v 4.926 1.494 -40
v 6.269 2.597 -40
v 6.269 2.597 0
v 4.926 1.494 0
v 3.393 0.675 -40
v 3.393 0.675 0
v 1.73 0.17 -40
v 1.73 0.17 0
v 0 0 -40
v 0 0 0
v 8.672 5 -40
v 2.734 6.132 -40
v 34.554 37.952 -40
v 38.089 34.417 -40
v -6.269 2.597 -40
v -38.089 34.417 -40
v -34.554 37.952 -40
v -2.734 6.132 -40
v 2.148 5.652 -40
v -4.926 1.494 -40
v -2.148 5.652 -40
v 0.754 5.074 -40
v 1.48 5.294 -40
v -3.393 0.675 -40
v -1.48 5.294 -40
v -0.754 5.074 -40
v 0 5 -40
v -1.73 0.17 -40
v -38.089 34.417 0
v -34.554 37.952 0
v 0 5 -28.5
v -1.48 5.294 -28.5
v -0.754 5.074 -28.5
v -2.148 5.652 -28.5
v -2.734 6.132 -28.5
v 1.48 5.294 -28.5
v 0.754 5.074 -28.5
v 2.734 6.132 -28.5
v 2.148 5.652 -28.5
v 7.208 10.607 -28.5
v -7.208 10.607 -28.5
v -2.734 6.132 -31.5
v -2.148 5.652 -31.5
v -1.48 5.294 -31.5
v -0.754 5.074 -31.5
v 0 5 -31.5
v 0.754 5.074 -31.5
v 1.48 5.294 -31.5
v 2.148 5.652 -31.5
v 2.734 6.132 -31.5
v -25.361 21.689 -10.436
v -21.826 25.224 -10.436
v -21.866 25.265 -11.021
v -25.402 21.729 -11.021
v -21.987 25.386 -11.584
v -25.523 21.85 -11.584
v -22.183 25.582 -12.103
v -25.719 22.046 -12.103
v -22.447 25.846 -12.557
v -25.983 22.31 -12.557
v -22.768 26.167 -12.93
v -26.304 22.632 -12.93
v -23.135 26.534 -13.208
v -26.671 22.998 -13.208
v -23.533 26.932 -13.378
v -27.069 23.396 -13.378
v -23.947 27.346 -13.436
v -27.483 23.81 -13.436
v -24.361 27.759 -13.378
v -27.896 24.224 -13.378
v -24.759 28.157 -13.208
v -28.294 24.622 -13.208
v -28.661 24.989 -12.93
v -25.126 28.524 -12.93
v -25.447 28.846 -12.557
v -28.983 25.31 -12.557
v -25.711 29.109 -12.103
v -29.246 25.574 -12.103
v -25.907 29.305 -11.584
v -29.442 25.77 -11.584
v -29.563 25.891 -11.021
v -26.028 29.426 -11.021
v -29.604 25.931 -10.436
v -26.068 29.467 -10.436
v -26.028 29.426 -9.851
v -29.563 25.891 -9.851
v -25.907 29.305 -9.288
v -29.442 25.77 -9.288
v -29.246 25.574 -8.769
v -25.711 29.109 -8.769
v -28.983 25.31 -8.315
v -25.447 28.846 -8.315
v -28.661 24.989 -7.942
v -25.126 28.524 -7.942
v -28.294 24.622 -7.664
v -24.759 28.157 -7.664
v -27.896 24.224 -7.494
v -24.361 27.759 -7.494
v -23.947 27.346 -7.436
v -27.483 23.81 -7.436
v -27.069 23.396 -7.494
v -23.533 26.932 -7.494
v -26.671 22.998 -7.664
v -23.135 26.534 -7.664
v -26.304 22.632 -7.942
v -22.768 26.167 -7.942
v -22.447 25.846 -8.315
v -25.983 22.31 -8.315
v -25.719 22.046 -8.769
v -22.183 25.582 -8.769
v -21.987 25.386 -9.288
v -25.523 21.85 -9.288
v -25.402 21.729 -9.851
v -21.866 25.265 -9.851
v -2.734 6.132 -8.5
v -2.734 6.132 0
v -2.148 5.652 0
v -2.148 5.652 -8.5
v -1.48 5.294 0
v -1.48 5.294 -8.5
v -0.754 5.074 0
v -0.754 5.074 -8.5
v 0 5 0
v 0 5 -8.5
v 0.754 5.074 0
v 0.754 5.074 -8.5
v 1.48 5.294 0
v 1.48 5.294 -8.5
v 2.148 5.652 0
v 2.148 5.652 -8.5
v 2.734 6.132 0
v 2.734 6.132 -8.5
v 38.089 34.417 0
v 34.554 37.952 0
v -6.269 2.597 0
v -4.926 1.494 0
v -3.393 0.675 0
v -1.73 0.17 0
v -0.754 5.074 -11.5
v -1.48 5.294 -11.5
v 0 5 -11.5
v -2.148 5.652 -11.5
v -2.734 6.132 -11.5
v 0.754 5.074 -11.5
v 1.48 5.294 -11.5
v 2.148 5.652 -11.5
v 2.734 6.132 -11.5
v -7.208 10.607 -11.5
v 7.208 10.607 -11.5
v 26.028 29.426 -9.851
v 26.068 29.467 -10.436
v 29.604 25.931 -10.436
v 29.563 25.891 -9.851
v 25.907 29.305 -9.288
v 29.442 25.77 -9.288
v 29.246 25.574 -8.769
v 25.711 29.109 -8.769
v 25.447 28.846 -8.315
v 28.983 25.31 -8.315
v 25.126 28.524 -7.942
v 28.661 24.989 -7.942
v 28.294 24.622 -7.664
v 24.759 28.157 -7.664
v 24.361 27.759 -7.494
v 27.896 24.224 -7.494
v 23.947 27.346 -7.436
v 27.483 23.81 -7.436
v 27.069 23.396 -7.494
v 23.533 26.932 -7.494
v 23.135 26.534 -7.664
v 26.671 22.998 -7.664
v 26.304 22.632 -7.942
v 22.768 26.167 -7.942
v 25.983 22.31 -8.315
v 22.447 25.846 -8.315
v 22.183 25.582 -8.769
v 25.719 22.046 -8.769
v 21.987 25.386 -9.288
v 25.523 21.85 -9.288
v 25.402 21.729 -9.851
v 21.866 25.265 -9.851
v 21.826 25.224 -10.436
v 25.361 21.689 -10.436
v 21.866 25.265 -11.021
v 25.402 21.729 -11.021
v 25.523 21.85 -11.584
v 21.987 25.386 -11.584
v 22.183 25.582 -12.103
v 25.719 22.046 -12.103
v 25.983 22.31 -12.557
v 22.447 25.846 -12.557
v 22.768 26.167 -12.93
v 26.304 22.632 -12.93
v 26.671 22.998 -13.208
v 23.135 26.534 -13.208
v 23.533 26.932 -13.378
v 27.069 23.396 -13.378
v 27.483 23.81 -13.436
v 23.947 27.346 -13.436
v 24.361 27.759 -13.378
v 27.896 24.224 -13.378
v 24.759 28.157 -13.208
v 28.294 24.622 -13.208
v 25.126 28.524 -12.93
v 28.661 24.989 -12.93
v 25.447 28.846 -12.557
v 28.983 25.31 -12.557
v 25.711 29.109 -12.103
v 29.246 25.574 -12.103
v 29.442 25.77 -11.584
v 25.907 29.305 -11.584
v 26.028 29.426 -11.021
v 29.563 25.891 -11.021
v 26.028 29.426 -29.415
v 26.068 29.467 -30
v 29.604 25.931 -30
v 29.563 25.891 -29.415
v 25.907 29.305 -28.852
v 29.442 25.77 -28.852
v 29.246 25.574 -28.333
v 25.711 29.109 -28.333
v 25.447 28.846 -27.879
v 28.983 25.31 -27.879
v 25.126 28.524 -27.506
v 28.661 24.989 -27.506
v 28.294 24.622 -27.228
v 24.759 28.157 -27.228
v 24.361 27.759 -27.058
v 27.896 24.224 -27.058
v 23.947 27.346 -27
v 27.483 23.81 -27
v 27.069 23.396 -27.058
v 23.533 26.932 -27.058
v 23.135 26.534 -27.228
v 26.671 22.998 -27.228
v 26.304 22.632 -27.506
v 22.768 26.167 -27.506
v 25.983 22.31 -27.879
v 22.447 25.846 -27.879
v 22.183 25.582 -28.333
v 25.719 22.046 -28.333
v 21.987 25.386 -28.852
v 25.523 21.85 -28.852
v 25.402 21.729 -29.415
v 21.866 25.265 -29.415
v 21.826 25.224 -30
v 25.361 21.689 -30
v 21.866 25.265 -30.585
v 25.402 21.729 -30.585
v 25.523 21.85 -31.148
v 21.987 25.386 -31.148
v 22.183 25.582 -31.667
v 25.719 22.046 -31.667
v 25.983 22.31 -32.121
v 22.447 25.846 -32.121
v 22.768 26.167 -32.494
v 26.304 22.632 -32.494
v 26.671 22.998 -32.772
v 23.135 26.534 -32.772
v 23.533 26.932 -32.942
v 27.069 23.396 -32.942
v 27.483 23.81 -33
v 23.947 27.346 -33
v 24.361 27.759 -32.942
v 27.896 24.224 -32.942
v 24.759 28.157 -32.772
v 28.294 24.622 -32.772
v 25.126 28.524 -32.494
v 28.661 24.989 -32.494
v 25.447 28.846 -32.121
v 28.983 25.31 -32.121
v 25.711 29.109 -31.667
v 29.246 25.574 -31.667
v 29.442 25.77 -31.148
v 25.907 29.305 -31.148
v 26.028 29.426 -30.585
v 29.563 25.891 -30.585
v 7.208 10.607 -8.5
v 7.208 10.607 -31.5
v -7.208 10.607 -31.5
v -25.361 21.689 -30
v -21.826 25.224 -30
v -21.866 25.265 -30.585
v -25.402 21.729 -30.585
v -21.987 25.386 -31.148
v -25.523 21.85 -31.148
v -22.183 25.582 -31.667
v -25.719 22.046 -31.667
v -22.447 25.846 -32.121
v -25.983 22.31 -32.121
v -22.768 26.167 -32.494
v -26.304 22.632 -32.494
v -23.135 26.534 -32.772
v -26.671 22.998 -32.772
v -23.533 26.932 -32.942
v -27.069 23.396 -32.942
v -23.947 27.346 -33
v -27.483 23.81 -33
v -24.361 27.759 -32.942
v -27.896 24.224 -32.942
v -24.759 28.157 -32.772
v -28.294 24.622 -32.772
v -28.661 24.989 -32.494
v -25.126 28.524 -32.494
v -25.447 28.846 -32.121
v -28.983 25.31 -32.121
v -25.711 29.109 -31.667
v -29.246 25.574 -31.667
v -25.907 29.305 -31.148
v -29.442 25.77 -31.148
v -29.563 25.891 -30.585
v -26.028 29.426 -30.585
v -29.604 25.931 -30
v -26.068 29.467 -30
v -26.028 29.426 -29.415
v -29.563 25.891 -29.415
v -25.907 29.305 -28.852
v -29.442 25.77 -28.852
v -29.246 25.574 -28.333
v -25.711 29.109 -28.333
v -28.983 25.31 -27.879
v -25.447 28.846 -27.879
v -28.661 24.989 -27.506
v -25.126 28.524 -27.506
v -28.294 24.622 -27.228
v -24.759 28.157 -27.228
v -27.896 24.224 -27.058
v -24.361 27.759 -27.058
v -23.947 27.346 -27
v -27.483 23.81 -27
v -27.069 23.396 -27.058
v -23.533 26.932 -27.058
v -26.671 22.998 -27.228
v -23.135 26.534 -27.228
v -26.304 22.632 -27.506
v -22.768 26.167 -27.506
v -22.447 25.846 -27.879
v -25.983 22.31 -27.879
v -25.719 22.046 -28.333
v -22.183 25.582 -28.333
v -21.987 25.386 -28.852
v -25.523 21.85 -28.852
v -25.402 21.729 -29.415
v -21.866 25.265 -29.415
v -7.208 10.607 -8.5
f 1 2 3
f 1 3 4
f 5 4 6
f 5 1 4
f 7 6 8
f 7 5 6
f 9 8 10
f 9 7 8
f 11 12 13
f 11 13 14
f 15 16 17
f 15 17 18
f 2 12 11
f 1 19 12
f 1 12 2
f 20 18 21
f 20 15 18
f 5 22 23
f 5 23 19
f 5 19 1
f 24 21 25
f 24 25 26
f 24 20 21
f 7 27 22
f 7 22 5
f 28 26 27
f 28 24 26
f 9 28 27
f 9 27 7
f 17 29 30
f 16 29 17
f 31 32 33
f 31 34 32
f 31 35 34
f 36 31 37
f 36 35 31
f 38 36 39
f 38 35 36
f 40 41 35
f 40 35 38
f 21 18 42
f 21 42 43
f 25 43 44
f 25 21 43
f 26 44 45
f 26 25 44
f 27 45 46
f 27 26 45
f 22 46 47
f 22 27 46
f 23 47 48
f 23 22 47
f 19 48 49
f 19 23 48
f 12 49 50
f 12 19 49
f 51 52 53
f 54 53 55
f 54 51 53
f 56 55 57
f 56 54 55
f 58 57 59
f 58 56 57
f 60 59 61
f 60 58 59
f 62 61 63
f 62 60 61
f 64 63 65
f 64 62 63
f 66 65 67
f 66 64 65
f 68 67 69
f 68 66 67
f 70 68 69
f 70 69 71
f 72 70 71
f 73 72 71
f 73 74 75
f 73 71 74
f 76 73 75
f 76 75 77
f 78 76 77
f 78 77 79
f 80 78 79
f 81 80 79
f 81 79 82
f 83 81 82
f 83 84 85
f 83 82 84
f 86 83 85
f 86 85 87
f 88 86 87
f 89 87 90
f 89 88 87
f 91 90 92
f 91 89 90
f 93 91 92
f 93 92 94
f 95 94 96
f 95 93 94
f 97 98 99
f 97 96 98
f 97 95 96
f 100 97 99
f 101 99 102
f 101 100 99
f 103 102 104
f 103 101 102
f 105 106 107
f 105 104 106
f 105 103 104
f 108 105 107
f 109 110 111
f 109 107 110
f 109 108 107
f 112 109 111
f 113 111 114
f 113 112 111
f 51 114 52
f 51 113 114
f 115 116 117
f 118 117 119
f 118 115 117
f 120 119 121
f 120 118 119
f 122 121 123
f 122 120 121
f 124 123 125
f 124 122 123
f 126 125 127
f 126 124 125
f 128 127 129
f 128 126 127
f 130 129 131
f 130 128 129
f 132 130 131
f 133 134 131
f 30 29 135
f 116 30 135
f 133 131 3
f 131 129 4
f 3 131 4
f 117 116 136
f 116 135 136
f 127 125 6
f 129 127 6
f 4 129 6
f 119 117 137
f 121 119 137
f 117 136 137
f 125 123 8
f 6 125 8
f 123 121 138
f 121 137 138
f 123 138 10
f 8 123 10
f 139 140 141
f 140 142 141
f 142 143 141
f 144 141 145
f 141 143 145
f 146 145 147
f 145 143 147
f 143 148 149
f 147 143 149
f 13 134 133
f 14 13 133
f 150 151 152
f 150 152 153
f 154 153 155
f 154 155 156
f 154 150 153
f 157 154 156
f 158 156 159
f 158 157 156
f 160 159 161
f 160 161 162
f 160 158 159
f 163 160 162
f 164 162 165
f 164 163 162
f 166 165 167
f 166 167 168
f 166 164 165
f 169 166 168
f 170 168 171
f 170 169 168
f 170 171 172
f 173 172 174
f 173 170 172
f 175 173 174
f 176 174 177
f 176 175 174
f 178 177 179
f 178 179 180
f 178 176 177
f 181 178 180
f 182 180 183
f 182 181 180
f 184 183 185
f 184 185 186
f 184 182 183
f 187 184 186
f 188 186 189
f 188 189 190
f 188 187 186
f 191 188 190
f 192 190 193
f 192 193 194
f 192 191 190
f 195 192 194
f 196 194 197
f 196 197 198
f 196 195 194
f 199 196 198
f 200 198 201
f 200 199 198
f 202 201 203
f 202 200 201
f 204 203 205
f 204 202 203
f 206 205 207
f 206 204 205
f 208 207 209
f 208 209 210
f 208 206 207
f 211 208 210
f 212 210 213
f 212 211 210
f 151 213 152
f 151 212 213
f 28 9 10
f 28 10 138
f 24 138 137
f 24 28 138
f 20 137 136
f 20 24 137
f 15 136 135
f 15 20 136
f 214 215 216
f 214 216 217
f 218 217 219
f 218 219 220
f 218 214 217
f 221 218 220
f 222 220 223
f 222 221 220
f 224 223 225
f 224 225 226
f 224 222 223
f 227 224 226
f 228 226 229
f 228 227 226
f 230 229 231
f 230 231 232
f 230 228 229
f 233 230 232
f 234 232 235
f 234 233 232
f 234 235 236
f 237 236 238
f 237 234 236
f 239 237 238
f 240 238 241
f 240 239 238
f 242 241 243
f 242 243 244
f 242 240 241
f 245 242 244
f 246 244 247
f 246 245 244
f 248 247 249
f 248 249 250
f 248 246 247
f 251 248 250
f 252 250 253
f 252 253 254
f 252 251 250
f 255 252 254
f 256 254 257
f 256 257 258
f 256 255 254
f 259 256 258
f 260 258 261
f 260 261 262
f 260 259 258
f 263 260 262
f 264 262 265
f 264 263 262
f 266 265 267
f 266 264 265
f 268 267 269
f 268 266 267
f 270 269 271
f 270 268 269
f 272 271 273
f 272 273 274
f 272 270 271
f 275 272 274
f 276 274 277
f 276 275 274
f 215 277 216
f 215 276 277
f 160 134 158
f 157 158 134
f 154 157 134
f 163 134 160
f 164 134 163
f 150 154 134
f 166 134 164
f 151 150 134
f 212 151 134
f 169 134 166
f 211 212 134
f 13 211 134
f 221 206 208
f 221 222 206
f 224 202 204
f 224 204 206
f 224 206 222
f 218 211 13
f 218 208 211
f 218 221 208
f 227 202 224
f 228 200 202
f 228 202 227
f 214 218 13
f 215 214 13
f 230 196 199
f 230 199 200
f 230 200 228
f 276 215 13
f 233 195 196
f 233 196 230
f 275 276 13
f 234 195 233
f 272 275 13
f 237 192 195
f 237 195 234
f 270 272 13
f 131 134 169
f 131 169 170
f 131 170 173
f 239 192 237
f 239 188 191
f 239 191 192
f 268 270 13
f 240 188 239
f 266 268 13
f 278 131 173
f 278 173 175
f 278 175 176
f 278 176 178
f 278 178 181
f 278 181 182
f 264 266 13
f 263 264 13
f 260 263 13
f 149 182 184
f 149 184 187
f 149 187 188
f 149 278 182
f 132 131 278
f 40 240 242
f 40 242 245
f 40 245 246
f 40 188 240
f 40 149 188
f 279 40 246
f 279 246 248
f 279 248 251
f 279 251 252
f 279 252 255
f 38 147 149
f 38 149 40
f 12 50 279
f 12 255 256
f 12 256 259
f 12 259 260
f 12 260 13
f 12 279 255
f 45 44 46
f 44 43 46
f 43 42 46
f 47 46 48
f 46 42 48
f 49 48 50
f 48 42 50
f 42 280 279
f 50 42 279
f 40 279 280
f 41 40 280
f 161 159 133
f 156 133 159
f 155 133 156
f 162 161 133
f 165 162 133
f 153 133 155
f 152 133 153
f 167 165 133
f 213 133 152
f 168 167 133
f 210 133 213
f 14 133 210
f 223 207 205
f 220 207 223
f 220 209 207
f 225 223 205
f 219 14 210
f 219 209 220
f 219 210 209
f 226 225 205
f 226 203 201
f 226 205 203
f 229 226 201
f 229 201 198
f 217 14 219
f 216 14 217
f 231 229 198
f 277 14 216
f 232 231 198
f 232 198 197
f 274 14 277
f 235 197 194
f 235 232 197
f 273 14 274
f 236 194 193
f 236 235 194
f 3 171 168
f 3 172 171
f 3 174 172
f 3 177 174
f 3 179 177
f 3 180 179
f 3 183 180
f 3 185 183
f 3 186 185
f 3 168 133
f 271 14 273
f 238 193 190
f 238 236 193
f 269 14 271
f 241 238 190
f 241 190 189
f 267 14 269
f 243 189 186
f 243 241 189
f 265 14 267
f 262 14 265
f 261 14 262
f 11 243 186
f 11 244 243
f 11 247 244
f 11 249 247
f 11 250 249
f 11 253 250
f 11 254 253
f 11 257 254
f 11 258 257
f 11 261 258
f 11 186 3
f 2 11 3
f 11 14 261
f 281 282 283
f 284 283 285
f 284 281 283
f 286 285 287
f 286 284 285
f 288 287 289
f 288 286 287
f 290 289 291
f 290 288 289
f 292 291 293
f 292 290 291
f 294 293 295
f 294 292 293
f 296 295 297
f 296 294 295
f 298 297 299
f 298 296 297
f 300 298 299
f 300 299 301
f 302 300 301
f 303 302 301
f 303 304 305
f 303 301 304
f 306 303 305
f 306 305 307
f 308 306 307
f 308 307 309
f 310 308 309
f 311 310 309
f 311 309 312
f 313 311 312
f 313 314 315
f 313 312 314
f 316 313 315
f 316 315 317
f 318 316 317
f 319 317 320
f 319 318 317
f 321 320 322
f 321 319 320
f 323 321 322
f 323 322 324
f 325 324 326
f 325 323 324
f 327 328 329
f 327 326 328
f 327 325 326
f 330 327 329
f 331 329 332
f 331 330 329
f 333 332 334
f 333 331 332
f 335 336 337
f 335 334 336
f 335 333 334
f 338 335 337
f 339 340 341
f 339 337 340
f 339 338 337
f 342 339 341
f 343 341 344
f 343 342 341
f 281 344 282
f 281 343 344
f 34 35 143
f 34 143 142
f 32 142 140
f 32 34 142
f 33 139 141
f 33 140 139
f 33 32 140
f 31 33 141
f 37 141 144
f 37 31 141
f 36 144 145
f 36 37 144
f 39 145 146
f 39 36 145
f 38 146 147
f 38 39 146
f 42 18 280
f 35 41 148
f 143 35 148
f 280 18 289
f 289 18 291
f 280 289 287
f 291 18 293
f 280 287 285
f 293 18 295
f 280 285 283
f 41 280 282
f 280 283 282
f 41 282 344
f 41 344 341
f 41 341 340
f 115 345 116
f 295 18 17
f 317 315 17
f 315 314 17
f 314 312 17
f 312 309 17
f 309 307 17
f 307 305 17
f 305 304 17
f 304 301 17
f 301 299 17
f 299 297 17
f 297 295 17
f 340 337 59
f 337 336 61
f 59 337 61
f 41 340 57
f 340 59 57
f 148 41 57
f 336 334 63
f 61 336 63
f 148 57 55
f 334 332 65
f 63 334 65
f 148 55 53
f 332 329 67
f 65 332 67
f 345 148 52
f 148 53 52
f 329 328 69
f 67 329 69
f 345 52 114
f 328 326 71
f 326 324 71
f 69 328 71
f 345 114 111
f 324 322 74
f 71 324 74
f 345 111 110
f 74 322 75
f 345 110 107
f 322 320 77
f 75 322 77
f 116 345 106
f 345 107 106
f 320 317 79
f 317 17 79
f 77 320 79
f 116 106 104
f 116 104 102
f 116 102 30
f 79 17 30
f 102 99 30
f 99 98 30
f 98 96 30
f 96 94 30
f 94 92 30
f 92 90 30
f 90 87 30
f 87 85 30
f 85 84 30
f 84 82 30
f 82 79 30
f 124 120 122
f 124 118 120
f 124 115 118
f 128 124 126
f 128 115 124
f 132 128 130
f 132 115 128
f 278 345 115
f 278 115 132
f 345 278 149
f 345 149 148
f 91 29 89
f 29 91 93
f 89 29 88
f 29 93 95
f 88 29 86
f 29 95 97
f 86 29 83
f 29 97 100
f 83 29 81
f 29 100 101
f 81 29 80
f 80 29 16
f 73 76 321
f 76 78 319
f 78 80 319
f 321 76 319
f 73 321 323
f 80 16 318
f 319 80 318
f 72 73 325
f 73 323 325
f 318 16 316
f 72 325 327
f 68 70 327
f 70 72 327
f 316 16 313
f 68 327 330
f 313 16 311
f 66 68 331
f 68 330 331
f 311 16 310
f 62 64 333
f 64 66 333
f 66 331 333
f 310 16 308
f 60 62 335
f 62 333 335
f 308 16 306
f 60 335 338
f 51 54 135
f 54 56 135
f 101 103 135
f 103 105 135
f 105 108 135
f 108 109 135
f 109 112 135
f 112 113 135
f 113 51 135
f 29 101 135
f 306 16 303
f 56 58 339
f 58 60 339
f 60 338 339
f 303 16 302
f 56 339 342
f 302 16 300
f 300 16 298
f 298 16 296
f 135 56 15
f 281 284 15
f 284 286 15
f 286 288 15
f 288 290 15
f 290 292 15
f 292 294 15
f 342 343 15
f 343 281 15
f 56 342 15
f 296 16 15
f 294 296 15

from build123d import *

# Parameters (mm, degrees)
SKETCH3_W           = 100
SKETCH3_H           = 40
SKETCH3_R           = 3
BOSS_EXTRUDE1_DEPTH = 5
FLEX1_START         = -36
FLEX1_OUTLINE_W     = 48.866197724
FLEX1_OUTLINE_H     = 40
FLEX1_DEPTH         = 33.40315081
FLEX1_START_2       = -2.59684919
FLEX1_2_OUTLINE_W   = 48.866197724
FLEX1_2_OUTLINE_H   = 40
FLEX1_2_OUTLINE_R   = 3
FLEX1_2_DEPTH       = 8.866197724
FLEX1_START_3       = 2.448182419
FLEX1_3_OUTLINE_W   = 5
FLEX1_3_OUTLINE_H   = 40
FLEX1_3_DEPTH       = 48.821166115
FLEX1_START_4       = -51.269348534
FLEX1_4_OUTLINE_W   = 3.866197724
FLEX1_4_OUTLINE_H   = 40
FLEX1_4_DEPTH       = 45
FLEX1_START_5       = 2.59684919
FLEX1_5_OUTLINE_R   = 3
FLEX1_5_OUTLINE_W   = 3.821166115
FLEX1_5_OUTLINE_H   = 40
FLEX1_5_DEPTH       = 33.40315081
FLEX1_START_6       = -2.40315081
FLEX1_6_OUTLINE_R   = 3
FLEX1_6_DEPTH       = 5
FLEX1_START_7       = 1.935784603
FLEX1_7_OUTLINE_W   = 0.045031609
FLEX1_7_OUTLINE_H   = 40
FLEX1_7_DEPTH       = 0.545856358
FLEX1_START_8       = -40
FLEX1_8_DEPTH       = 40
BOSS_EXTRUDE2_DEPTH = 1.5


with BuildPart() as part:
    # Sketch3 → Boss-Extrude1 (new body)
    with BuildSketch(Plane(origin=(0, 0, 0), x_dir=(1, 0, 0), z_dir=(0, 1, 0))):
        with Locations((0, 20)):
            Rectangle(SKETCH3_W, SKETCH3_H)
        with Locations(Location((35, 30, 0), (0, 0, 270))):
            Circle(SKETCH3_R, mode=Mode.SUBTRACT)
        with Locations(Location((35, 10.435948304, 0), (0, 0, 270))):
            Circle(SKETCH3_R, mode=Mode.SUBTRACT)
        with Locations(Location((-35, 10.435948304, 0), (0, 0, 90))):
            Circle(SKETCH3_R, mode=Mode.SUBTRACT)
        with Locations(Location((-35, 30, 0), (0, 0, 90))):
            Circle(SKETCH3_R, mode=Mode.SUBTRACT)
    extrude(amount=BOSS_EXTRUDE1_DEPTH)

    # Flex1: read off the stored shape, not the designer's step
    # Flex1 outline → Flex1 (cut)
    with BuildSketch(Plane(origin=(0, 0, 0), x_dir=(0.707106781186546, -0.707106781186549, 0), z_dir=(0.707106781186549, 0.707106781186546, 0)).offset(FLEX1_START)):
        with Locations((-26.836249672, 20)):
            Rectangle(FLEX1_OUTLINE_W, FLEX1_OUTLINE_H)
    extrude(amount=FLEX1_DEPTH, mode=Mode.SUBTRACT)

    # Flex1 2 outline → Flex1 2 (add)
    with BuildSketch(Plane(origin=(0, 0, 0), x_dir=(0.707106781186546, -0.707106781186549, 0), z_dir=(0.707106781186549, 0.707106781186546, 0)).offset(FLEX1_START_2)):
        with Locations((-26.836249672, 20)):
            Rectangle(FLEX1_2_OUTLINE_W, FLEX1_2_OUTLINE_H)
        with Locations((-36.269348534, 10.435948304)):
            Circle(FLEX1_2_OUTLINE_R, mode=Mode.SUBTRACT)
        with Locations((-36.269348534, 30)):
            Circle(FLEX1_2_OUTLINE_R, mode=Mode.SUBTRACT)
    extrude(amount=FLEX1_2_DEPTH)

    # Flex1 3 outline → Flex1 3 (add)
    with BuildSketch(Plane(origin=(0, 0, 0), x_dir=(0.707106781186546, -0.707106781186549, 0), z_dir=(0.707106781186549, 0.707106781186546, 0)).offset(FLEX1_START_3)):
        with Locations((0.09684919, 20)):
            Rectangle(FLEX1_3_OUTLINE_W, FLEX1_3_OUTLINE_H)
    extrude(amount=FLEX1_3_DEPTH)

    # Flex1 4 outline → Flex1 4 (cut)
    with BuildSketch(Plane(origin=(0, 0, 0), x_dir=(0.707106781186546, 0.707106781186549, 0), z_dir=(0.707106781186549, -0.707106781186546, 0)).offset(FLEX1_START_4)):
        with Locations((4.336249672, -20)):
            Rectangle(FLEX1_4_OUTLINE_W, FLEX1_4_OUTLINE_H)
    extrude(amount=FLEX1_4_DEPTH, mode=Mode.SUBTRACT)

    # Flex1 5 outline → Flex1 5 (cut)
    with BuildSketch(Plane(origin=(0, 0, 0), x_dir=(0.707106781186546, 0.707106781186549, 0), z_dir=(0.707106781186549, -0.707106781186546, 0)).offset(FLEX1_START_5)):
        with Locations((36.269348534, -10.435948304)):
            Circle(FLEX1_5_OUTLINE_R)
        with Locations((36.269348534, -30)):
            Circle(FLEX1_5_OUTLINE_R)
        with Locations((4.358765477, -20)):
            Rectangle(FLEX1_5_OUTLINE_W, FLEX1_5_OUTLINE_H)
    extrude(amount=FLEX1_5_DEPTH, mode=Mode.SUBTRACT)

    # Flex1 6 outline → Flex1 6 (cut)
    with BuildSketch(Plane(origin=(0, 0, 0), x_dir=(0.707106781186546, 0.707106781186549, 0), z_dir=(0.707106781186549, -0.707106781186546, 0)).offset(FLEX1_START_6)):
        with Locations((36.269348534, -10.435948304)):
            Circle(FLEX1_6_OUTLINE_R)
        with Locations((36.269348534, -30)):
            Circle(FLEX1_6_OUTLINE_R)
    extrude(amount=FLEX1_6_DEPTH, mode=Mode.SUBTRACT)

    # Flex1 7 outline → Flex1 7 (cut)
    with BuildSketch(Plane(origin=(0, 0, 0), x_dir=(0.707106781186546, 0.707106781186549, 0), z_dir=(0.707106781186549, -0.707106781186546, 0)).offset(FLEX1_START_7)):
        with Locations((2.425666614, -20)):
            Rectangle(FLEX1_7_OUTLINE_W, FLEX1_7_OUTLINE_H)
    extrude(amount=FLEX1_7_DEPTH, mode=Mode.SUBTRACT)

    # Flex1 8 outline → Flex1 8 (cut)
    with BuildSketch(Plane.XY.offset(FLEX1_START_8)):
        with BuildLine():
            ThreePointArc((-2.733814628, 6.132383096), (0, 5), (2.733814628, 6.132383096))
            Line((2.733814628, 6.132383096), (0, 8.866197724))
            Line((0, 8.866197724), (-2.733814628, 6.132383096))
        make_face()
        with BuildLine():
            Line((3.567376062, -0.105123282), (6.269348534, 2.59684919))
            ThreePointArc((6.269348534, 2.59684919), (3.392946977, 0.674899116), (0, 0))
            Line((0, 0), (3.398568468, 0))
            Line((3.398568468, 0), (3.068090654, 0.330477814))
            Line((3.068090654, 0.330477814), (3.09993281, 0.36231997))
            Line((3.09993281, 0.36231997), (3.567376062, -0.105123282))
        make_face()
        with BuildLine():
            Line((-3.398568468, 0), (0, 0))
            ThreePointArc((0, 0), (-3.392946977, 0.674899116), (-6.269348534, 2.59684919))
            Line((-6.269348534, 2.59684919), (-3.535533906, -0.136965438))
            Line((-3.535533906, -0.136965438), (-3.398568468, 0))
        make_face()
        Polygon((8.672499344, 5), (6.269348534, 2.59684919), (8.866197724, 0), (50, 0), (50, 5), align=None)
    extrude(amount=FLEX1_8_DEPTH, mode=Mode.SUBTRACT)

    # Sketch4 → Boss-Extrude2 (add, symmetric)
    with BuildSketch(Plane.XY.offset(-10)):
        Polygon((0, 0), (10.606601718, 10.606601718), (-10.606601718, 10.606601718), align=None)
    boss_extrude2 = extrude(amount=BOSS_EXTRUDE2_DEPTH, both=True)

    # Mirror1: Boss-Extrude2 across plane
    add(boss_extrude2.mirror(Plane.XY.offset(-20)))


solid = part.part
